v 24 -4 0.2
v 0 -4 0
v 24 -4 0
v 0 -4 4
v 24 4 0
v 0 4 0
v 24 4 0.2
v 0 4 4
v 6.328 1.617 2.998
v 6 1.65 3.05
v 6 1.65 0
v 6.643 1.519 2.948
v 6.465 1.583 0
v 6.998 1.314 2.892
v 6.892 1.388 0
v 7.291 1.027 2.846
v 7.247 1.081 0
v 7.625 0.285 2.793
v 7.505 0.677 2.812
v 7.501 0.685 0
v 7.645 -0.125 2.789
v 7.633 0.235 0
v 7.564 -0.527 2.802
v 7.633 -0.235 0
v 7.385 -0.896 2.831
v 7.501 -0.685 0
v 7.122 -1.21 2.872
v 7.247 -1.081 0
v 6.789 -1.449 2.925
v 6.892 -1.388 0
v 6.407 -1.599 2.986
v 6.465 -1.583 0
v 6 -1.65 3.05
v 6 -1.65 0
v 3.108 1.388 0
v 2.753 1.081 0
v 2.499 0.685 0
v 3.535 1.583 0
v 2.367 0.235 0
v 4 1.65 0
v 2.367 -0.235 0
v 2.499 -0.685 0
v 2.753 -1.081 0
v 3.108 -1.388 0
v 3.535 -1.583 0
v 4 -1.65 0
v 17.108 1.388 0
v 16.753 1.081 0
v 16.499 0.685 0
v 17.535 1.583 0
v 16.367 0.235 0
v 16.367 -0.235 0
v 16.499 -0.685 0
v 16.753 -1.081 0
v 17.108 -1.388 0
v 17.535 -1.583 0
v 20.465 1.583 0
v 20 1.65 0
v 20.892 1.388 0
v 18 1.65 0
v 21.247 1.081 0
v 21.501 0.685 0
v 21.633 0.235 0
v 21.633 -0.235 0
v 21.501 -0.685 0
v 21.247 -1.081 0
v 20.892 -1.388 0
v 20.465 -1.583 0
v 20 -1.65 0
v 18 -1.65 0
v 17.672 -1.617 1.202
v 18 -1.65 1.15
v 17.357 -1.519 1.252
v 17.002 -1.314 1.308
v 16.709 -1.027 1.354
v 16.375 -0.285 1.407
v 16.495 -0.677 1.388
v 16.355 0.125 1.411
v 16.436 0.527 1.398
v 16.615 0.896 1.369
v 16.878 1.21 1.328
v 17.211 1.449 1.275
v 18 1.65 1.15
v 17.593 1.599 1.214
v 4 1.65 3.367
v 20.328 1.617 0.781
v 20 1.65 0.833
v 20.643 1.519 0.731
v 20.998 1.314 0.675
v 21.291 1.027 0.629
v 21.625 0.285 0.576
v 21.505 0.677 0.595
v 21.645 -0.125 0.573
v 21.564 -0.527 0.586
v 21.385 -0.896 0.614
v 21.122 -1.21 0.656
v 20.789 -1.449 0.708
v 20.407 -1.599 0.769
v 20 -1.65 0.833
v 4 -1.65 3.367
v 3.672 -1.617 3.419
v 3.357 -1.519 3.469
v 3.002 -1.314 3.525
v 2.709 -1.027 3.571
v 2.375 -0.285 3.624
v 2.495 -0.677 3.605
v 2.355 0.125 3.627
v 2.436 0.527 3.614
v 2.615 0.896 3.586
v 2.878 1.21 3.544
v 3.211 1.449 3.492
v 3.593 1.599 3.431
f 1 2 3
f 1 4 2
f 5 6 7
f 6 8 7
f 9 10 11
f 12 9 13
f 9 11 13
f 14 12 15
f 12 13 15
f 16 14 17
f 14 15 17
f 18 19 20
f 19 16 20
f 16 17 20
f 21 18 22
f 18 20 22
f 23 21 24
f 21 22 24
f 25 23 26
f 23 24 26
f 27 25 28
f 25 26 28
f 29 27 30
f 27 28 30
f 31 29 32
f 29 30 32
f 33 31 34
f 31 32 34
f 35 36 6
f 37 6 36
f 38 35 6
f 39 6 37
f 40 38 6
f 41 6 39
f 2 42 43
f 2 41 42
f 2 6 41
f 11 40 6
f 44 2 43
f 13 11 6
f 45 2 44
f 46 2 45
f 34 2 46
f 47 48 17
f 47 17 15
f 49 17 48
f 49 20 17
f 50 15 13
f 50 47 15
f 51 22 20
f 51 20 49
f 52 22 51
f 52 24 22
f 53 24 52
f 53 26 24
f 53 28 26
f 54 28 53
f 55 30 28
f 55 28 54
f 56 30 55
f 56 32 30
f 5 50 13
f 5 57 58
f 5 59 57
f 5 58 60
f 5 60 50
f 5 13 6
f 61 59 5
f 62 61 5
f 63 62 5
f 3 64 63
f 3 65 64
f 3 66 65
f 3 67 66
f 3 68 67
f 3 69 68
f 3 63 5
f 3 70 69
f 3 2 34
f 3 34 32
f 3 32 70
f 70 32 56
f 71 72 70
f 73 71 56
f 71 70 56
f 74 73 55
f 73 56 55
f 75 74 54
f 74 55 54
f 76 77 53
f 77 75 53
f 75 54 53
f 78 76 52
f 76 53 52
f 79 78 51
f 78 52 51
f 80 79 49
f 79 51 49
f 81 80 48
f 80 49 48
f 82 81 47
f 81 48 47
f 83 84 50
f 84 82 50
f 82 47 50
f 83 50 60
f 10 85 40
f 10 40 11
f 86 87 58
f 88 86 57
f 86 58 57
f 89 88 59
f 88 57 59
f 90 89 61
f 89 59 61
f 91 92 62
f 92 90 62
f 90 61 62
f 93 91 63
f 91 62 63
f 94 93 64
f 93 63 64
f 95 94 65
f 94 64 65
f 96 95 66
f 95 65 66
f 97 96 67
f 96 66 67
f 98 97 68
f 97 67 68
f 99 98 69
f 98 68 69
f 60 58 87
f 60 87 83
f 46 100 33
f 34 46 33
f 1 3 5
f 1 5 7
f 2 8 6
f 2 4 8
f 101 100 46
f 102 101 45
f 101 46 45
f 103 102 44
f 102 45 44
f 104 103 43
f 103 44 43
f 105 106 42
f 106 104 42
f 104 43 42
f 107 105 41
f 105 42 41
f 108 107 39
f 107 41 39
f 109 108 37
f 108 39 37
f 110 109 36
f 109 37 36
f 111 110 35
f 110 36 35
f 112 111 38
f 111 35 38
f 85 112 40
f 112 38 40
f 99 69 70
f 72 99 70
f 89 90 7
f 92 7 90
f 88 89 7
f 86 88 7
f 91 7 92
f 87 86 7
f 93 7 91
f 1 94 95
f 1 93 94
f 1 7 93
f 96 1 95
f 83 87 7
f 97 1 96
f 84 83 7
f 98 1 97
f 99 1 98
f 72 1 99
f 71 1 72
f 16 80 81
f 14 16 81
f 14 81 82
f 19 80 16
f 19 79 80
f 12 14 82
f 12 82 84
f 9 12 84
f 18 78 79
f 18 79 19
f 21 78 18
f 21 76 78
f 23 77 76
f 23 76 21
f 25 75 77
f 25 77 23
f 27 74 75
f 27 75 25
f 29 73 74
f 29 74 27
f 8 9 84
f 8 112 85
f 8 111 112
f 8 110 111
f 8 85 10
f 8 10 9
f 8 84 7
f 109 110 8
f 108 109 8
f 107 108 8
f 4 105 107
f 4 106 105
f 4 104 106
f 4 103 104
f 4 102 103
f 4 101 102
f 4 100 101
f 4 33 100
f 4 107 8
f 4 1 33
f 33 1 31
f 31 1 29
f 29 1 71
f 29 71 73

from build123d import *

# Parameters (mm, degrees)
PAD_DEPTH    = 4
POCKET_DEPTH = 4.001


with BuildPart() as part:
    # Sketch → Pad (new body, symmetric)
    with BuildSketch(Plane.XZ):
        Polygon((0, 0), (24, 0), (24, 0.2), (0, 4), align=None)
    extrude(amount=PAD_DEPTH, both=True)

    # Sketch001 (on Face1 of Pad) → Pocket (cut, through all)
    with BuildSketch(Plane(origin=(0, 0, 0), x_dir=(1, 0, 0), z_dir=(0, 0, -1))):
        with BuildLine():
            ThreePointArc((4, 1.65), (2.35, 0), (4, -1.65))
            Line((4, -1.65), (6, -1.65))
            ThreePointArc((6, -1.65), (7.65, 0), (6, 1.65))
            Line((4, 1.65), (6, 1.65))
        make_face()
        with BuildLine():
            ThreePointArc((20, -1.65), (21.65, 0), (20, 1.65))
            Line((20, 1.65), (18, 1.65))
            ThreePointArc((18, 1.65), (16.35, 0), (18, -1.65))
            Line((20, -1.65), (18, -1.65))
        make_face()
    extrude(amount=-POCKET_DEPTH, mode=Mode.SUBTRACT)


solid = part.part
